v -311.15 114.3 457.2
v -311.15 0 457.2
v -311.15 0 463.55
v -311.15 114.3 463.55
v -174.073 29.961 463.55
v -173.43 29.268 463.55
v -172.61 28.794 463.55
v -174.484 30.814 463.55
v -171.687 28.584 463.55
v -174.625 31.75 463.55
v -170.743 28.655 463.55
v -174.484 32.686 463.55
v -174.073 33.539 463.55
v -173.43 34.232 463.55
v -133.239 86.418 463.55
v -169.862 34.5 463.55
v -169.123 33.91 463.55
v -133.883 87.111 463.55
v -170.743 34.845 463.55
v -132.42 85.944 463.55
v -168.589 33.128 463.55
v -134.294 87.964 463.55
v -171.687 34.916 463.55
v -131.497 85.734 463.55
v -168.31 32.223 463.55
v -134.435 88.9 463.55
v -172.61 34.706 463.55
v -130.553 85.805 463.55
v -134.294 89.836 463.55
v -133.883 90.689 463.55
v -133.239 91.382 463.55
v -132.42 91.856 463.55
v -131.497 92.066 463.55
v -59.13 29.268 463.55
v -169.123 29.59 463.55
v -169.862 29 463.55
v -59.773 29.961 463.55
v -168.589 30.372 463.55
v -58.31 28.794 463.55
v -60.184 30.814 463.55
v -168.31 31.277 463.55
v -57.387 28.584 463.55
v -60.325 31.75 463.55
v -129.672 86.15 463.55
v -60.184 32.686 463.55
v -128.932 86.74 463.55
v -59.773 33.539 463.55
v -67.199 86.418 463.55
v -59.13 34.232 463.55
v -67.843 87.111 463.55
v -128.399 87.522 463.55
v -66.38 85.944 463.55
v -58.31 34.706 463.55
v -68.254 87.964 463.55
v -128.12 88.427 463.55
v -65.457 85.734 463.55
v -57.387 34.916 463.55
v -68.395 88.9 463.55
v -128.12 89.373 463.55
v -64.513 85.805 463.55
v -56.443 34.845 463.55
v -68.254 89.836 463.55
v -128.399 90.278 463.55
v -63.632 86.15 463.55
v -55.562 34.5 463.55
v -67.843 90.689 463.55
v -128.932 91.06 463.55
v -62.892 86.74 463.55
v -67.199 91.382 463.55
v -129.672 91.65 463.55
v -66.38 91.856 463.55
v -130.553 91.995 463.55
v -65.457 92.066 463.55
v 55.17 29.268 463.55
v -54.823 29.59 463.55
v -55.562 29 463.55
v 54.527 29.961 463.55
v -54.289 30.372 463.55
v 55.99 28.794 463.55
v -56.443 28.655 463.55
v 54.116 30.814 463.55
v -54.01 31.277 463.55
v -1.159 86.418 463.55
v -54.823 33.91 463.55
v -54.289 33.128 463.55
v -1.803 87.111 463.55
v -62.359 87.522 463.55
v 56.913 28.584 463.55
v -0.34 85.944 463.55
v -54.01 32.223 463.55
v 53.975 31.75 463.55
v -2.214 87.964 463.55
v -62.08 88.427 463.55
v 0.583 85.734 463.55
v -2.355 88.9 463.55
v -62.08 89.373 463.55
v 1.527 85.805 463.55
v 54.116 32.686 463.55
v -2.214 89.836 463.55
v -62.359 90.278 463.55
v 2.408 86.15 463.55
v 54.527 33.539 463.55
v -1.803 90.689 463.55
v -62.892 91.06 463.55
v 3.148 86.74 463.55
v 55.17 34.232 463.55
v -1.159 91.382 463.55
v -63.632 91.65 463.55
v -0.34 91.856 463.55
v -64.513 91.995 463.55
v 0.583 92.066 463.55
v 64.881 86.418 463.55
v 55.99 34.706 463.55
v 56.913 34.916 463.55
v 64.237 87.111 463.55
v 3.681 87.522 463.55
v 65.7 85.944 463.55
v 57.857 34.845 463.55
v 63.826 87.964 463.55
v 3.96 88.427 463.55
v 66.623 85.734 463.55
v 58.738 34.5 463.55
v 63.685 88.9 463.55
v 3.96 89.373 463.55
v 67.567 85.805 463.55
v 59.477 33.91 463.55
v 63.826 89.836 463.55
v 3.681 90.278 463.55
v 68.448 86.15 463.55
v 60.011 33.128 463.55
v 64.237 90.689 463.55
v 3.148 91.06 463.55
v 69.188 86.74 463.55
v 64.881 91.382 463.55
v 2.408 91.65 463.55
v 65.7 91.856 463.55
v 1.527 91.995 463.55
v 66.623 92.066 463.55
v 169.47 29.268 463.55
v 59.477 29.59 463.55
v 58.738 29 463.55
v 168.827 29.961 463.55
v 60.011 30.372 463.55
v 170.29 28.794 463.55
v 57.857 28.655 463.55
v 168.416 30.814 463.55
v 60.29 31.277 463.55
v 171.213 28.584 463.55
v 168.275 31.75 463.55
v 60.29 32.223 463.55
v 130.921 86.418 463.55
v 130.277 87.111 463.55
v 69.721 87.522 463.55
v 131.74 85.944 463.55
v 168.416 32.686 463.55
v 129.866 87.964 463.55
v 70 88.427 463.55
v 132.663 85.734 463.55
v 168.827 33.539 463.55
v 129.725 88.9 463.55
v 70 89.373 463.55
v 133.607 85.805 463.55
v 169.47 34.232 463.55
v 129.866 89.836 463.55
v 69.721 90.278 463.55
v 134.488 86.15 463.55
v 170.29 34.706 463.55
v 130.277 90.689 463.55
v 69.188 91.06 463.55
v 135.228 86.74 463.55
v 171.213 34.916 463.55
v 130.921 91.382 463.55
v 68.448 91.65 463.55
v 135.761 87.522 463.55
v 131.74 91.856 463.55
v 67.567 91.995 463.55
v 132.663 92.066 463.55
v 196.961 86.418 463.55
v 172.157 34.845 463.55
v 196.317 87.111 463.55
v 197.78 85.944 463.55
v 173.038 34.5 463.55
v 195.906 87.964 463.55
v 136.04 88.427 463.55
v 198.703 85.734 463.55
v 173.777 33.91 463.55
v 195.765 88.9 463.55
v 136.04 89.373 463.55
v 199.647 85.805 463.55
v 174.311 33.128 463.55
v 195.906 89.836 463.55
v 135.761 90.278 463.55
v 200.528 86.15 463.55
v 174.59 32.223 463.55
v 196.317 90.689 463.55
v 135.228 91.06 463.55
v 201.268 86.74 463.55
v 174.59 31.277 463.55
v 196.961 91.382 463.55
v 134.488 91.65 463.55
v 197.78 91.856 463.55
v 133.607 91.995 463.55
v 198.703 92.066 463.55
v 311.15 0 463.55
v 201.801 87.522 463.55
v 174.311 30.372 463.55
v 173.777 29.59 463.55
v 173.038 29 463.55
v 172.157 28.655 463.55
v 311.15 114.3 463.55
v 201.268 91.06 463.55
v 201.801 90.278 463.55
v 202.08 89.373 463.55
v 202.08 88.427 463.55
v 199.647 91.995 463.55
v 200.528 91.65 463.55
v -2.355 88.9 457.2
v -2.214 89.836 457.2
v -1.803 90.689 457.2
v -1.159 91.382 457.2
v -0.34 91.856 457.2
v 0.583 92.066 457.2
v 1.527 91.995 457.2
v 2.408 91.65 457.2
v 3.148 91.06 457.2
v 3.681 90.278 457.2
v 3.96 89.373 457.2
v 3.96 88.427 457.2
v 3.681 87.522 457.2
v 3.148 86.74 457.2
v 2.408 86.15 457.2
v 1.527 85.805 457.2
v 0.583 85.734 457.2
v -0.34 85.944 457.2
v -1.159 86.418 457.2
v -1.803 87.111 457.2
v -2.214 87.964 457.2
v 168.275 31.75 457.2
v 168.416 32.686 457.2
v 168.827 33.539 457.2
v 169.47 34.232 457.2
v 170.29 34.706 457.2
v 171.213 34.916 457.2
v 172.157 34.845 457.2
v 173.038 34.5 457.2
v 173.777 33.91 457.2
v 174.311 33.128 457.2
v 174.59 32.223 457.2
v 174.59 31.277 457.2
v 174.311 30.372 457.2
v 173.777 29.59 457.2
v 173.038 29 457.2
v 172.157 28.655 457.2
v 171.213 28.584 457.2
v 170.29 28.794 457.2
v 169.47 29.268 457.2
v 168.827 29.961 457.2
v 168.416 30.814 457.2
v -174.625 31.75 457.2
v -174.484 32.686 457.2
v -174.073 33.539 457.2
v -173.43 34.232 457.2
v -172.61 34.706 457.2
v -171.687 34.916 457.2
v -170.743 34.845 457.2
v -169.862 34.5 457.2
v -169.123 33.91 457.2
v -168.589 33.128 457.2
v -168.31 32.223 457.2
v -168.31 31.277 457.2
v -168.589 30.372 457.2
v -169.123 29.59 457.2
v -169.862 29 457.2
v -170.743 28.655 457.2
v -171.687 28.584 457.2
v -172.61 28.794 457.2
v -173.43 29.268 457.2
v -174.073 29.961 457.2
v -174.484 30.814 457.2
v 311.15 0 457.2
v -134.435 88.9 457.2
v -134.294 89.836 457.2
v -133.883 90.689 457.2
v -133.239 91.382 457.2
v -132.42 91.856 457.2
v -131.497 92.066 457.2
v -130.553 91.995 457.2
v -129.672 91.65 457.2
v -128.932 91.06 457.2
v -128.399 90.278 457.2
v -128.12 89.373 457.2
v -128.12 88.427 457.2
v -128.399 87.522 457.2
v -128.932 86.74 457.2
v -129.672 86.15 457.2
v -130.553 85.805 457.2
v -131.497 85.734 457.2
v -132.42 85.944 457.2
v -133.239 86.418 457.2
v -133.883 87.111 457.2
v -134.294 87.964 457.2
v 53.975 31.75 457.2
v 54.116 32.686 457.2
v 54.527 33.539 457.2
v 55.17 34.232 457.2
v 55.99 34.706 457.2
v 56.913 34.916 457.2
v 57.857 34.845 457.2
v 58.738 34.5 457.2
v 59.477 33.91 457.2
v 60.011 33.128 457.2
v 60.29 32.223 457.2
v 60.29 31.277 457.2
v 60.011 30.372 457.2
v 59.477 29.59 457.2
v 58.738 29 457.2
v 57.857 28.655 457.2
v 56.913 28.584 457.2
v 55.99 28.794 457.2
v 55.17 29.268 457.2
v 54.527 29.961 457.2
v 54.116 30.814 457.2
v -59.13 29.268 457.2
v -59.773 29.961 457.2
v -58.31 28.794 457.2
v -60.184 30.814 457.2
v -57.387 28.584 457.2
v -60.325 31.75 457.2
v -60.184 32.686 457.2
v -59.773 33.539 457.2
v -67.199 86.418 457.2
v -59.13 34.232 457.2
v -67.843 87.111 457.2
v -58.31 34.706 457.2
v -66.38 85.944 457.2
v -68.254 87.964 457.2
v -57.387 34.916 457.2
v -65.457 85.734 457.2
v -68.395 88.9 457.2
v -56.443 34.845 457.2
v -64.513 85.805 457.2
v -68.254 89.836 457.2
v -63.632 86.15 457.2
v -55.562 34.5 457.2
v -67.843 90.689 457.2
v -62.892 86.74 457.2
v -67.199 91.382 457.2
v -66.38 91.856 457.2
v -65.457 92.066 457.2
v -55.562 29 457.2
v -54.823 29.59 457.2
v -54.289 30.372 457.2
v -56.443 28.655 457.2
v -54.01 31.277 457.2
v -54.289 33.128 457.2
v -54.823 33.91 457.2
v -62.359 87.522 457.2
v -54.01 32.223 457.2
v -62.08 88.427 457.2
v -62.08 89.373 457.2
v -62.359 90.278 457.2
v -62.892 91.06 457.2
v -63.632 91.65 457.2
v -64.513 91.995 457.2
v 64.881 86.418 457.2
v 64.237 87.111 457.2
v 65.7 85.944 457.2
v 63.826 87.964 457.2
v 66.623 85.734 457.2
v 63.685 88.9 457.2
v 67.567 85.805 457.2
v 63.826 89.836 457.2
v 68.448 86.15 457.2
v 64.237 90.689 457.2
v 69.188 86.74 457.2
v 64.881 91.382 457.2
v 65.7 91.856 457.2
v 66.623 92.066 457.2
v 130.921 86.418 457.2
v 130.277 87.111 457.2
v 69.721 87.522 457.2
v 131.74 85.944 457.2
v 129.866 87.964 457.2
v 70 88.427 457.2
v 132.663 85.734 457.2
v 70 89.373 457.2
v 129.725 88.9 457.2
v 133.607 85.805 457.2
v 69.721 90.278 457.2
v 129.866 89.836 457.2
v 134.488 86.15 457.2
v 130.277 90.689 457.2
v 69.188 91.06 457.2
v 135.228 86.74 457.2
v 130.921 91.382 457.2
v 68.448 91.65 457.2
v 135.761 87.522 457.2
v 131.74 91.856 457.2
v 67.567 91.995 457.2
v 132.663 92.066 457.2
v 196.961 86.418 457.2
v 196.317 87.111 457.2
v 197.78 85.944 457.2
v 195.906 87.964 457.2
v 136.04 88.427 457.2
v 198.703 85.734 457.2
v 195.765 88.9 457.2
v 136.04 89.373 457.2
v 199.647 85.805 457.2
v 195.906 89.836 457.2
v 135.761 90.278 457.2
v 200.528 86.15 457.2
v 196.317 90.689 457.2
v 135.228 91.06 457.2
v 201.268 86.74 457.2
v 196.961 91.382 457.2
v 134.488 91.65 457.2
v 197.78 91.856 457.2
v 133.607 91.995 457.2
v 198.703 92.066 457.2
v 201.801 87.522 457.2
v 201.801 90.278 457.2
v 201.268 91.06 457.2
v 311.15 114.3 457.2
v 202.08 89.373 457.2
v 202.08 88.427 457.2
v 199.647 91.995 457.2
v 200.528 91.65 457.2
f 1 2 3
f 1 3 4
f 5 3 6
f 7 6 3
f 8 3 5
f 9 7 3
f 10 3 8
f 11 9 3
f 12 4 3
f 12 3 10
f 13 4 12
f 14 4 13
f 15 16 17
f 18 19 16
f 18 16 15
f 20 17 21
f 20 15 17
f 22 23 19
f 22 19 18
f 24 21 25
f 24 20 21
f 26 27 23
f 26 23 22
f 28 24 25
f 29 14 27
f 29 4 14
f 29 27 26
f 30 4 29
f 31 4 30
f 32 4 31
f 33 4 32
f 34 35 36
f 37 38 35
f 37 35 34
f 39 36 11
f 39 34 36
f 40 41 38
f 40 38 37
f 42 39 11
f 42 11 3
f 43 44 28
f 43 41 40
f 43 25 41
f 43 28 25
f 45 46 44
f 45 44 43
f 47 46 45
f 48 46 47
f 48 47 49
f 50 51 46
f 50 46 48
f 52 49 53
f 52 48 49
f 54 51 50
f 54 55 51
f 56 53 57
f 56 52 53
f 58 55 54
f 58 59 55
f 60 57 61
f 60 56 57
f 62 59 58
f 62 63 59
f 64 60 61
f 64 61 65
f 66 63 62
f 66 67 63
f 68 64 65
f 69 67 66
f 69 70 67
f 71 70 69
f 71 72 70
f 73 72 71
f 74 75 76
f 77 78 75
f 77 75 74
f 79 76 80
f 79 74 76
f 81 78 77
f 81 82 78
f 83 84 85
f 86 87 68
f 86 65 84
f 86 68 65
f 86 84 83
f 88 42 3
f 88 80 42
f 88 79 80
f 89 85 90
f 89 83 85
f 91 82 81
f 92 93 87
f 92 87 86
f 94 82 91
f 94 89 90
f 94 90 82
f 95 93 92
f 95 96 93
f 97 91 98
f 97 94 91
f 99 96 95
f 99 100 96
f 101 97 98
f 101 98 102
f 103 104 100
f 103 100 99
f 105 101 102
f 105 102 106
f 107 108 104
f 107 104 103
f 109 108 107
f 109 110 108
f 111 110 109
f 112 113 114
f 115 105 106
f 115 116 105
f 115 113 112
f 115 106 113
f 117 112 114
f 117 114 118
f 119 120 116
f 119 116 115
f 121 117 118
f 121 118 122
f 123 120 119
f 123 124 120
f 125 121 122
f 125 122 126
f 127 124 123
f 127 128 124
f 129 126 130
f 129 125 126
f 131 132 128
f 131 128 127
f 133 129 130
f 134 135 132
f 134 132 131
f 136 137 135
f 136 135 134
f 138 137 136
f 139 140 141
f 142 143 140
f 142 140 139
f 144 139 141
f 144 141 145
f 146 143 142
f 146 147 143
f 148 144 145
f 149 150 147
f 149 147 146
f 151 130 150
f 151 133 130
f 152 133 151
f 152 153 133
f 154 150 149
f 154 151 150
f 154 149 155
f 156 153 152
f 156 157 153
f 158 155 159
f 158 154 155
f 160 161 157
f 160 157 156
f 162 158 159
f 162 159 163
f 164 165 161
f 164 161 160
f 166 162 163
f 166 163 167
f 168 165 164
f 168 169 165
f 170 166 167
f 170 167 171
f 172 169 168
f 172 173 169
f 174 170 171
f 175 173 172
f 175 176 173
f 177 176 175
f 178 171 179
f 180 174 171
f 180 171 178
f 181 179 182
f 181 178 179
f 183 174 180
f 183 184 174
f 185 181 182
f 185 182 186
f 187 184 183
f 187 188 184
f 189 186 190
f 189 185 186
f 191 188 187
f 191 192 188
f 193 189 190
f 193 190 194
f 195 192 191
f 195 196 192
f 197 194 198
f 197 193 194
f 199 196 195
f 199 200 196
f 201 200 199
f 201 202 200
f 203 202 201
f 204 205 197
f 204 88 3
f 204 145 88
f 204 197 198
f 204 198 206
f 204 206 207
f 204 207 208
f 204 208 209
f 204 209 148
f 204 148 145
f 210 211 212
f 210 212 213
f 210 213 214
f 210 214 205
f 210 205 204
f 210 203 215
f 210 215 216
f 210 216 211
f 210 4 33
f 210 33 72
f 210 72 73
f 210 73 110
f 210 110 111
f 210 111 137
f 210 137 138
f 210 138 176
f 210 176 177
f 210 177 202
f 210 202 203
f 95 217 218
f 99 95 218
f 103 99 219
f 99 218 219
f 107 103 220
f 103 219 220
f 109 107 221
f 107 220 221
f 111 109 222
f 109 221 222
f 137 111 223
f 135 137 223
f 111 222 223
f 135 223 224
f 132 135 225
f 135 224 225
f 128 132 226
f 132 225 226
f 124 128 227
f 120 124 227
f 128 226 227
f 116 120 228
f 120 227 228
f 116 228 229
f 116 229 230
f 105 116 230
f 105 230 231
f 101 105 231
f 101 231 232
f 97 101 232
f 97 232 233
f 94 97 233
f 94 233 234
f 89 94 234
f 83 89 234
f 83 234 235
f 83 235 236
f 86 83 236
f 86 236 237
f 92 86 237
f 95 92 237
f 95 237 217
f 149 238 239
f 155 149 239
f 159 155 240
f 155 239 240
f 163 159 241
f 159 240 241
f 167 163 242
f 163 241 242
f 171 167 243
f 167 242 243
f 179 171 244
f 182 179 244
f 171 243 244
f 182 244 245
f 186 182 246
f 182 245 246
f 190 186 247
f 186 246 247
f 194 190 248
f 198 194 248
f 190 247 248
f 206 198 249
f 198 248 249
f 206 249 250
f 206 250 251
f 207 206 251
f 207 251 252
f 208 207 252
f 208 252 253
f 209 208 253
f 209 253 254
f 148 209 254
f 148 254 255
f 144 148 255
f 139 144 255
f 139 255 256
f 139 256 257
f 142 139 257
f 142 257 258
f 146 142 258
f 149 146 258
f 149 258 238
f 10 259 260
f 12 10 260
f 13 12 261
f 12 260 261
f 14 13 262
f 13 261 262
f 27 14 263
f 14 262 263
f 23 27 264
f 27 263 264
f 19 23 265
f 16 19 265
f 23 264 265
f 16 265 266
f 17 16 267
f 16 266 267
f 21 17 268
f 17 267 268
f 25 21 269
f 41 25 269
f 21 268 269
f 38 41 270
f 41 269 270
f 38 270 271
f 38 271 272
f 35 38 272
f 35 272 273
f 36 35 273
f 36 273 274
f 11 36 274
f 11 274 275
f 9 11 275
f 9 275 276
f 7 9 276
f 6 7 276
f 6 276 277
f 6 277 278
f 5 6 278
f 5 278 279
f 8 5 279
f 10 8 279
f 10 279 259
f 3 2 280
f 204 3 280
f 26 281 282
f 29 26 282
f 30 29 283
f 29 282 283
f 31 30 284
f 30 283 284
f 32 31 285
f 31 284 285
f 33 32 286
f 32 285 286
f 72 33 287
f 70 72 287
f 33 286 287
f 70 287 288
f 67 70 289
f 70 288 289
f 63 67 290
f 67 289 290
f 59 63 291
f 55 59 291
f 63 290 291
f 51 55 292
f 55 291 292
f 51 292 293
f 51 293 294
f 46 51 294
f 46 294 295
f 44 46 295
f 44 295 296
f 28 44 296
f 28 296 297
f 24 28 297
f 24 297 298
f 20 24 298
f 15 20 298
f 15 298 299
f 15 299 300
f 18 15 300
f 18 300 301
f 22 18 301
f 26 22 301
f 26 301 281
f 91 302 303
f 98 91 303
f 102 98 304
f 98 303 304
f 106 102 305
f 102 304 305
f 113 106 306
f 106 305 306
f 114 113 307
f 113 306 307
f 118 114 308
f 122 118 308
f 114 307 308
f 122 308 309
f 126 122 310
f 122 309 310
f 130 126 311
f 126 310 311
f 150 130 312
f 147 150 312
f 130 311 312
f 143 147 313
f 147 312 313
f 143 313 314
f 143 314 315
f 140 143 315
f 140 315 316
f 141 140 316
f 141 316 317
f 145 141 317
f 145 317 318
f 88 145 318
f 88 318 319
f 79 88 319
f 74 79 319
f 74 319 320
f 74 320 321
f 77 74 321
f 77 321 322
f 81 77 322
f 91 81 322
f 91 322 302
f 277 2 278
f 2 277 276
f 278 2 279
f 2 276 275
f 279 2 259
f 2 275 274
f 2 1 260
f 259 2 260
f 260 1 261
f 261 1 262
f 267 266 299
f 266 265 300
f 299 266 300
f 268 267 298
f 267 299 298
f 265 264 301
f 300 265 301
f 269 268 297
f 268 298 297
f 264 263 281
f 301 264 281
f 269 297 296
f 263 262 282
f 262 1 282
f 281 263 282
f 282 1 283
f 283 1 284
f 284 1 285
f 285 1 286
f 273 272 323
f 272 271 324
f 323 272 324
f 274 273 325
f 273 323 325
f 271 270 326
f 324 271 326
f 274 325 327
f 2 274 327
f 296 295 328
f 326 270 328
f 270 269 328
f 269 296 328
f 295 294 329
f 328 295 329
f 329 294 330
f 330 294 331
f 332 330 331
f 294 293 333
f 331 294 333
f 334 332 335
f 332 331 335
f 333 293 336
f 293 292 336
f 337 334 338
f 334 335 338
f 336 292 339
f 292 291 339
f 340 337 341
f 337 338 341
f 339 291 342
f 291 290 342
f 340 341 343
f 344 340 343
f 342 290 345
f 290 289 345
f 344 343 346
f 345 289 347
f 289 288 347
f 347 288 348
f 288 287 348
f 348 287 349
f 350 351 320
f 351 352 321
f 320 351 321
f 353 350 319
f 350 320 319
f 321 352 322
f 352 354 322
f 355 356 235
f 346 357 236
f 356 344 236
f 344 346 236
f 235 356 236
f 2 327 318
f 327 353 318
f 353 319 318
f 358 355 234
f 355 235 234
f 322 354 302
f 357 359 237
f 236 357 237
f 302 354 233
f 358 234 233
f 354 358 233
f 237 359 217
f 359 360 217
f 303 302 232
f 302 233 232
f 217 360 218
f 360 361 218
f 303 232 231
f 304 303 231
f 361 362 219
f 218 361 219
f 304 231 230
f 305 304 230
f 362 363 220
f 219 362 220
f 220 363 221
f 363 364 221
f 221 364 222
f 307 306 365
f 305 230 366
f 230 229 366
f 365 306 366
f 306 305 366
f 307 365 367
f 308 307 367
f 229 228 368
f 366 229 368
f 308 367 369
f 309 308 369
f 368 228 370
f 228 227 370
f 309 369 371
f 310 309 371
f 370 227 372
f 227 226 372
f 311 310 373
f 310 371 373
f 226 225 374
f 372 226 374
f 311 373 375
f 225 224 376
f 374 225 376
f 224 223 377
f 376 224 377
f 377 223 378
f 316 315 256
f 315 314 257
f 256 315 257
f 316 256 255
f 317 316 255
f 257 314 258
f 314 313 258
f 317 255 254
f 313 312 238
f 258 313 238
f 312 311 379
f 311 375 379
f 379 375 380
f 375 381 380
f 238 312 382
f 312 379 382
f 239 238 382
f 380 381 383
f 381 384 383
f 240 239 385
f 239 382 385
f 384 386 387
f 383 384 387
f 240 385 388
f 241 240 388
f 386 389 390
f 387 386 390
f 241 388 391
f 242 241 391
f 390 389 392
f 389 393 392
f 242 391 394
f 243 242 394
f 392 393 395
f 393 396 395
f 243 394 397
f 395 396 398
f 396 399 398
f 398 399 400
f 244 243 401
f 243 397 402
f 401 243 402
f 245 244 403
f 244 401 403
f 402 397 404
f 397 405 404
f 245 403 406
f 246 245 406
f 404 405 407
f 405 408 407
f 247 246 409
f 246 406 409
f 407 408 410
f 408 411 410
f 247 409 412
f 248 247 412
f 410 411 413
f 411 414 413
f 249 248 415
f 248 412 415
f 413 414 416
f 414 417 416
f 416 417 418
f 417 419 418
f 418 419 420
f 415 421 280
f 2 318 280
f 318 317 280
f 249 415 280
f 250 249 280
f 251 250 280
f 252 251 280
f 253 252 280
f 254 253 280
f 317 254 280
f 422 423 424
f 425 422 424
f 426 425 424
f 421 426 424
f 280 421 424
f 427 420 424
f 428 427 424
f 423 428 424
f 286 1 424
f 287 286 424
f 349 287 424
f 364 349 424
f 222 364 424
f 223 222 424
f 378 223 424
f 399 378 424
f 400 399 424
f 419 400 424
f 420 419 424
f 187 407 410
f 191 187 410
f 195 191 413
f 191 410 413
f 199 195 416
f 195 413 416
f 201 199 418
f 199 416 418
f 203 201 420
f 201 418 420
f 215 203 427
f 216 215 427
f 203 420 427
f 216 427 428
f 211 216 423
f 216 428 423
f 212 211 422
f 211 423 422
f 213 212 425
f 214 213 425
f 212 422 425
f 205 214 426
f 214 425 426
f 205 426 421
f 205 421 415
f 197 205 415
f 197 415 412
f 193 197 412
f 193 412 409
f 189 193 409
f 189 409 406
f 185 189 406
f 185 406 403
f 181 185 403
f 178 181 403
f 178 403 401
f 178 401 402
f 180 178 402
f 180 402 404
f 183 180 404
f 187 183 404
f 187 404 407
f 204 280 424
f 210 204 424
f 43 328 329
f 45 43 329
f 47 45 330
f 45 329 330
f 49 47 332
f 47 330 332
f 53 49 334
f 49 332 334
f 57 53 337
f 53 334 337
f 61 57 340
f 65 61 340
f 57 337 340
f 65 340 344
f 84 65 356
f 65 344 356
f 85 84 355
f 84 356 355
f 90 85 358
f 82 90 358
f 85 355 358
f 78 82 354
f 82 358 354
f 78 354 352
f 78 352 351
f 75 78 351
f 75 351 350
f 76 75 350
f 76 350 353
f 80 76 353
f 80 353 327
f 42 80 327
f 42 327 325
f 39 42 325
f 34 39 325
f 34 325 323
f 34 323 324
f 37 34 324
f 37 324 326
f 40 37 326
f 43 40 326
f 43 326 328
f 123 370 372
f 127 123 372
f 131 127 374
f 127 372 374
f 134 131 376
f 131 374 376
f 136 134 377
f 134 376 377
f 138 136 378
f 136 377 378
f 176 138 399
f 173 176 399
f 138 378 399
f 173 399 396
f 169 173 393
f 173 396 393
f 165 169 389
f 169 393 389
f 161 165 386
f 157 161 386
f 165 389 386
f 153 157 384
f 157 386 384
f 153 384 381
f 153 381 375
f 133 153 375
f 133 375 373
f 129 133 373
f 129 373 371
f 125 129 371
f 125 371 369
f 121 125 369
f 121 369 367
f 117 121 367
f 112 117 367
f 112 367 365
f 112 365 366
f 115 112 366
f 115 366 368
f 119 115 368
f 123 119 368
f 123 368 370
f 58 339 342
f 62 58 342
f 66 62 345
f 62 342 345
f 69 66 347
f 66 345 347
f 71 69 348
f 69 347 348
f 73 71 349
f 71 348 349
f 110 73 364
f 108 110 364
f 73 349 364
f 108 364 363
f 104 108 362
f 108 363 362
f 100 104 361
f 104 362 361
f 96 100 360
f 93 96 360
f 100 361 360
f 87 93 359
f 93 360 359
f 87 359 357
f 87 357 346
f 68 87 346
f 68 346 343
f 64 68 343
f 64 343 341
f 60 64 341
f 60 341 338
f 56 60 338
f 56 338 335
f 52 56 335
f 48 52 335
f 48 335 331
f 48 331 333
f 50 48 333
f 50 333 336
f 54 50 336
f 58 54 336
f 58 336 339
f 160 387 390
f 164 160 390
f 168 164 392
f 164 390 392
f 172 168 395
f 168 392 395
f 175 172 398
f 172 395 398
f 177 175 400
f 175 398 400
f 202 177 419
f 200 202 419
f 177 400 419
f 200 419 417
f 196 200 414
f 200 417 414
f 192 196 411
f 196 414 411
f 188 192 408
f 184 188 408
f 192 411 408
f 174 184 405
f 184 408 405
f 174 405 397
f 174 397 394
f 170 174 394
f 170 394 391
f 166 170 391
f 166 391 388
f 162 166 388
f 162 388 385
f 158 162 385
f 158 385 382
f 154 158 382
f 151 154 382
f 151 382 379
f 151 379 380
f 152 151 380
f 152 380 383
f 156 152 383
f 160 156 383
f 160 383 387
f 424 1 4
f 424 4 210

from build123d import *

# Parameters (mm, degrees)
SKETCH1_W                   = 622.3
SKETCH1_H                   = 114.3
BOSS_EXTRUDE1_DEPTH         = 6.35
F_1_4_0_25_DIAMETER_HOLE1_D = 6.35
LPATTERN1_COUNT             = 6
LPATTERN1_PITCH             = 66.04
F_1_4_0_25_DIAMETER_HOLE2_D = 6.35
LPATTERN2_COUNT             = 4
LPATTERN2_PITCH             = 114.3


with BuildPart() as part:
    # Sketch1 → Boss-Extrude1 (new body)
    with BuildSketch(Plane.XY.offset(457.2)):
        with Locations((0, 57.15)):
            Rectangle(SKETCH1_W, SKETCH1_H)
    extrude(amount=BOSS_EXTRUDE1_DEPTH)

    # 1/4 (0.25) Diameter Hole1 (through all)
    with Locations(Plane.XY.offset(463.55)):
        with Locations((-131.259730304, 88.9)):
            f_1_4_0_25_diameter_hole1 = Hole(F_1_4_0_25_DIAMETER_HOLE1_D / 2)

    # LPattern1: 1/4 (0.25) Diameter Hole1 ×6
    with Locations(*[(i * LPATTERN1_PITCH, 0, 0) for i in range(1, LPATTERN1_COUNT)]):
        add(f_1_4_0_25_diameter_hole1, mode=Mode.SUBTRACT)

    # 1/4 (0.25) Diameter Hole2 (through all)
    with Locations(Plane.XY.offset(463.55)):
        with Locations((-171.45, 31.75)):
            f_1_4_0_25_diameter_hole2 = Hole(F_1_4_0_25_DIAMETER_HOLE2_D / 2)

    # LPattern2: 1/4 (0.25) Diameter Hole2 ×4
    with Locations(*[(i * LPATTERN2_PITCH, 0, 0) for i in range(1, LPATTERN2_COUNT)]):
        add(f_1_4_0_25_diameter_hole2, mode=Mode.SUBTRACT)


solid = part.part
